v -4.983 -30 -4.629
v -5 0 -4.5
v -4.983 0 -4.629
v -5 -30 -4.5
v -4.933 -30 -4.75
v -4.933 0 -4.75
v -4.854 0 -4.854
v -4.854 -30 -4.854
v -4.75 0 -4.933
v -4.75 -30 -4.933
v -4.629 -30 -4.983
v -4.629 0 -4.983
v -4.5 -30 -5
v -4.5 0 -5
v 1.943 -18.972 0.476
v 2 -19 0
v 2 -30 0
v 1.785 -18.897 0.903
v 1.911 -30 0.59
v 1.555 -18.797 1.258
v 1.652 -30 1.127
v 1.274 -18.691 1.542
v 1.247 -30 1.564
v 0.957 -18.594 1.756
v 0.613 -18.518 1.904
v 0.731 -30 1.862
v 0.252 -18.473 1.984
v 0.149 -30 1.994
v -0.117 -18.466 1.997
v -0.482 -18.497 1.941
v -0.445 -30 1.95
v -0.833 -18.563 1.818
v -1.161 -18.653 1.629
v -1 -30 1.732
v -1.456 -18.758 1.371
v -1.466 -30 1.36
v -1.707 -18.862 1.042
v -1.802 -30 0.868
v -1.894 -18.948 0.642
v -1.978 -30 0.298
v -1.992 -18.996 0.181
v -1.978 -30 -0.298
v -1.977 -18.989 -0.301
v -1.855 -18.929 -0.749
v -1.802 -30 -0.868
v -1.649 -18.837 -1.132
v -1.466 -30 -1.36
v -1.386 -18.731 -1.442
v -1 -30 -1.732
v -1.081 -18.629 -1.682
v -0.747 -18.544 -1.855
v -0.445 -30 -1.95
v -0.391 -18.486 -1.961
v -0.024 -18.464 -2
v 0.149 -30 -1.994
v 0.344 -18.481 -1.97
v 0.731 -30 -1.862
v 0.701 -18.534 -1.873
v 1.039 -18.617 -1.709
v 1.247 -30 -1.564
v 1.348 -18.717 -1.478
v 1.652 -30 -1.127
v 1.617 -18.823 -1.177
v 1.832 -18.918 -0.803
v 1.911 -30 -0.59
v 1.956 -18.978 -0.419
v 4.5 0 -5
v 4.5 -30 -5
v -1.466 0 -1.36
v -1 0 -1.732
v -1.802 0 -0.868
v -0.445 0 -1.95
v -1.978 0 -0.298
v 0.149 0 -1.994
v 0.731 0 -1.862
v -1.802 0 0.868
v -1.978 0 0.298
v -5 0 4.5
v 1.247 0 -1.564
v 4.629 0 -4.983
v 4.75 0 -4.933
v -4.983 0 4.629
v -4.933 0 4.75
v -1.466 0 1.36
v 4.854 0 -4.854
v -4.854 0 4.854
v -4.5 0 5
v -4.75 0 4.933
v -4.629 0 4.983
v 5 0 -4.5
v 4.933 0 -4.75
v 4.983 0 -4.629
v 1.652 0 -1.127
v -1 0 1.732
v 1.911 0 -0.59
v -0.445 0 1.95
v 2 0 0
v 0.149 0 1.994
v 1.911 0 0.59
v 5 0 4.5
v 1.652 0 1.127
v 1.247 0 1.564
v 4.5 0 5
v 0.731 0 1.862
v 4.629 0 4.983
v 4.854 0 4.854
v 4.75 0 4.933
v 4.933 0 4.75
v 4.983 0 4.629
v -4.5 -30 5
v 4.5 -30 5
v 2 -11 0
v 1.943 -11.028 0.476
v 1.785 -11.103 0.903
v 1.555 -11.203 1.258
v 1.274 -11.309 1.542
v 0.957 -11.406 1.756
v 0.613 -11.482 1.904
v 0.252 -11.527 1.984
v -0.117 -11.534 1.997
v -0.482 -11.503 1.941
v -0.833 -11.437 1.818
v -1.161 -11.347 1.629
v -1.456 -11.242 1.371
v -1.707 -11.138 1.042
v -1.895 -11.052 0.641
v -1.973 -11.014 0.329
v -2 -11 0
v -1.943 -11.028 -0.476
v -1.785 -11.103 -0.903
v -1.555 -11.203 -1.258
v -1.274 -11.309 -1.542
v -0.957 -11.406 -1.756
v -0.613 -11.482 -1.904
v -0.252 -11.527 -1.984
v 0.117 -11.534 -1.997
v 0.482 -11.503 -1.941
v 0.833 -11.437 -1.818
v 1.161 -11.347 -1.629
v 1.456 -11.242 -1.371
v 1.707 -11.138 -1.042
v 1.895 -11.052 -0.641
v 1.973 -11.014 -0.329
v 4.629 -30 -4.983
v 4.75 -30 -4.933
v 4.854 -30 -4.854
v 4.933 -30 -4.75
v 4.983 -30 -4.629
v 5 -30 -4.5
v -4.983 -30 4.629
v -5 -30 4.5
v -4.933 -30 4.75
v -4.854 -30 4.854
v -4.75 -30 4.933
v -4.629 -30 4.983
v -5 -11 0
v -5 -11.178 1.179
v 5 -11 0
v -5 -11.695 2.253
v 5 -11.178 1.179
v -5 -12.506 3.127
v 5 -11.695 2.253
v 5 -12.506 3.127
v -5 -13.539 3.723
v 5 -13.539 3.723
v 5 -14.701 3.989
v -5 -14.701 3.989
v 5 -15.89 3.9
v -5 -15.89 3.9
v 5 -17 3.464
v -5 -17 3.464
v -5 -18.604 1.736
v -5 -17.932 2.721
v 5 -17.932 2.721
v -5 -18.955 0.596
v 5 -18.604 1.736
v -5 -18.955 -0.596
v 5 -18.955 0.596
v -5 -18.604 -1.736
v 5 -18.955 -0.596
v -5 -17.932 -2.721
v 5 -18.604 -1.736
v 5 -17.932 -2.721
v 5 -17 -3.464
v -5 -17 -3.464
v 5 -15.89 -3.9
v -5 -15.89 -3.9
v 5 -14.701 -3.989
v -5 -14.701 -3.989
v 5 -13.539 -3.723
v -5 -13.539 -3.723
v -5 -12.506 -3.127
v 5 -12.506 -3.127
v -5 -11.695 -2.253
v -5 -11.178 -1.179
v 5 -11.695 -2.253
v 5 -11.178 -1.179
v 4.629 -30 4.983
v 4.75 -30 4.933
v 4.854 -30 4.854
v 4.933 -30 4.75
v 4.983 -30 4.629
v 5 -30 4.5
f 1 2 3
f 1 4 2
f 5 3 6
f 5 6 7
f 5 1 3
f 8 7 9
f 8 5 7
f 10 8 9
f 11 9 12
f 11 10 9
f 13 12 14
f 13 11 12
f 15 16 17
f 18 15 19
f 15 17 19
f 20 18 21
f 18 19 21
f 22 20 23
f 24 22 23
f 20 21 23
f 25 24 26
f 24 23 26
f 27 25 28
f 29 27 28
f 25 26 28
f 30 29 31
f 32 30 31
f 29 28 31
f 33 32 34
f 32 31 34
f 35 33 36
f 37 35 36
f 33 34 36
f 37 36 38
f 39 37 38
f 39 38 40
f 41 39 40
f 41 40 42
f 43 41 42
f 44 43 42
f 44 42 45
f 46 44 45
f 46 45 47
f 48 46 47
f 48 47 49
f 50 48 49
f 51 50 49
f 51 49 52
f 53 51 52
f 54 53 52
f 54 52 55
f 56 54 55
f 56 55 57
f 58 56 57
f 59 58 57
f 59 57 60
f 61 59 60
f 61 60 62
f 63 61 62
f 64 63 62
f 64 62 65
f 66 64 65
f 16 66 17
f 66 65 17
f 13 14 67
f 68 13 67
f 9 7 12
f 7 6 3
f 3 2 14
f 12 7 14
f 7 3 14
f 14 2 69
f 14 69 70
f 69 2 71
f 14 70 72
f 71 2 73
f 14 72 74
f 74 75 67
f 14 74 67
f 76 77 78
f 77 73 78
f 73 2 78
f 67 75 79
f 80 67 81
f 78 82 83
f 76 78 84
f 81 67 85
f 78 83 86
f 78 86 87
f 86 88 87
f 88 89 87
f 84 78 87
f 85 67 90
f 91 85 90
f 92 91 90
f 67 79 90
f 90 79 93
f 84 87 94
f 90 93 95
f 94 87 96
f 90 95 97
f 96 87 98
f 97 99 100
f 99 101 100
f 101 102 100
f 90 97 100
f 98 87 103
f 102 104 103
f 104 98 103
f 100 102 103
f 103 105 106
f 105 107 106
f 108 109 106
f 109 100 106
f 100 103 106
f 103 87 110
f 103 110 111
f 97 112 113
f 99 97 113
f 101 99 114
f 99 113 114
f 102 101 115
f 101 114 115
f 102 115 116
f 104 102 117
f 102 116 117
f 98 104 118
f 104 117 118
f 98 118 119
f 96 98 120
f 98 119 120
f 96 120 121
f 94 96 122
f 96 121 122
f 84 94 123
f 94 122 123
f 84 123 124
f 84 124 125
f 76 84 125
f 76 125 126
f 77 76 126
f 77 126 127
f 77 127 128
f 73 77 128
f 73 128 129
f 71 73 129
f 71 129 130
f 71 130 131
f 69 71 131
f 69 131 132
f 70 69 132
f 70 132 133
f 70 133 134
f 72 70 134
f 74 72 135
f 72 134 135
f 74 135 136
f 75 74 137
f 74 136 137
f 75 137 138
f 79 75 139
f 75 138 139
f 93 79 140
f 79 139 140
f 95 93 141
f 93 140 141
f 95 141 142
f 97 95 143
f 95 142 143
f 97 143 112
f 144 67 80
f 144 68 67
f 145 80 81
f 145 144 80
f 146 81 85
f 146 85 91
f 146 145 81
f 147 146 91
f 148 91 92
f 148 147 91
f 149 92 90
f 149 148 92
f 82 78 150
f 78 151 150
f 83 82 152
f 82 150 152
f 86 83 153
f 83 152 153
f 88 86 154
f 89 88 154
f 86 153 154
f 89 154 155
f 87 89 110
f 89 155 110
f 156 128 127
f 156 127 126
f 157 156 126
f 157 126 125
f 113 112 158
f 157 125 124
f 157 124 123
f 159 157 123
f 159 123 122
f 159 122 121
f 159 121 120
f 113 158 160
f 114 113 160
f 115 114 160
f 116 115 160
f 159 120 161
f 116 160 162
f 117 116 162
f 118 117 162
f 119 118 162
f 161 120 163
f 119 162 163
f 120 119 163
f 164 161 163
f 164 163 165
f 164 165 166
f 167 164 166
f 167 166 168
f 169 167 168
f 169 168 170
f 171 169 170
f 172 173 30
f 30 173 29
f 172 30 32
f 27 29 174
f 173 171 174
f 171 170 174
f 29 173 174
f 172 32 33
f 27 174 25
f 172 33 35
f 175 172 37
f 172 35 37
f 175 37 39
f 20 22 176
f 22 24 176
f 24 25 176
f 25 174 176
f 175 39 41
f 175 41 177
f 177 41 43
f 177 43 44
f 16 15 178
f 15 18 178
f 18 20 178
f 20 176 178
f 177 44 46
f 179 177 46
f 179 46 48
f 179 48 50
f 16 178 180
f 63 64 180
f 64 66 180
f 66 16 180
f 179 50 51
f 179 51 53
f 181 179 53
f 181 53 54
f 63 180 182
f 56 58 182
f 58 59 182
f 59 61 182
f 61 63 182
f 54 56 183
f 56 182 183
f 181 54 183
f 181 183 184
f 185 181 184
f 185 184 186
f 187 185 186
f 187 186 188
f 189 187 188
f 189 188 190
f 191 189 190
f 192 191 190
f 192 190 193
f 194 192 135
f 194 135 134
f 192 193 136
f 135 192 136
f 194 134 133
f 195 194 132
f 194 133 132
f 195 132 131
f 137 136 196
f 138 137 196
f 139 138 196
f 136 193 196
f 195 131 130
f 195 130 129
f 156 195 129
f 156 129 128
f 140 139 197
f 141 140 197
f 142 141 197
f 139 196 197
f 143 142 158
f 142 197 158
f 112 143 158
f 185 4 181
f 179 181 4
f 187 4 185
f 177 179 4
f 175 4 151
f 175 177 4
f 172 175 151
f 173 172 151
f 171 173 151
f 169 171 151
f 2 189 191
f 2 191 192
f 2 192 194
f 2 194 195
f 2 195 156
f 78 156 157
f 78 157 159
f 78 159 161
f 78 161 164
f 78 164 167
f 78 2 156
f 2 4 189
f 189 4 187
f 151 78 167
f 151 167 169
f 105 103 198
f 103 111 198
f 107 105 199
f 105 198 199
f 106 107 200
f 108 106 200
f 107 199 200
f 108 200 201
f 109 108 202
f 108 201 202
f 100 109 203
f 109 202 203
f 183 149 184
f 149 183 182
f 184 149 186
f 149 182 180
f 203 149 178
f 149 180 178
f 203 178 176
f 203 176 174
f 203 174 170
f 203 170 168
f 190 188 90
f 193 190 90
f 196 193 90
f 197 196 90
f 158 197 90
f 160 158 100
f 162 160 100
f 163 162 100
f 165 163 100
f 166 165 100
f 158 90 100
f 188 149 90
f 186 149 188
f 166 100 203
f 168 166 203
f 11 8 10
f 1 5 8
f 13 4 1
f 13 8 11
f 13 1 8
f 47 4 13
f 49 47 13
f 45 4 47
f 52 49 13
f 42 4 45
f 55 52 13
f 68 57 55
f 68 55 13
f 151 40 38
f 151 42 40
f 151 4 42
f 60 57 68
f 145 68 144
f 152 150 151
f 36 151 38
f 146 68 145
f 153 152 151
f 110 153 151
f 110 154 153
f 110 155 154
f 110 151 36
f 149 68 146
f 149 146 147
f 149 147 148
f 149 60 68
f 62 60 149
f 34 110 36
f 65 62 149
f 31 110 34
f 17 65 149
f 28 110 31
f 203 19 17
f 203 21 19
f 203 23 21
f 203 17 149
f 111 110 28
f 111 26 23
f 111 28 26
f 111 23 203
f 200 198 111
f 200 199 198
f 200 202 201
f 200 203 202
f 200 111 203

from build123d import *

# Parameters (mm, degrees)
F0_W     = 10
F0_H     = 10
F1_DEPTH = 30
F2_R     = 2
F3_DEPTH = 46.4
F4_R     = 4
F5_DEPTH = 25
F6_R     = 0.5


with BuildPart() as f1:
    # F0 (on Front) → F1 (new body)
    with BuildSketch(Plane.XZ):
        Rectangle(F0_W, F0_H)
    extrude(amount=F1_DEPTH)

    # F2 (on face) → F3 (cut)
    with BuildSketch(Plane.XZ.offset(30)):
        Circle(F2_R)
    extrude(amount=-F3_DEPTH, mode=Mode.SUBTRACT)

    # F4 (on face) → F5 (cut)
    with BuildSketch(Plane.YZ.offset(5)):
        with Locations((-15, 0)):
            Circle(F4_R)
    extrude(amount=-F5_DEPTH, mode=Mode.SUBTRACT)

    # F6
    f6_edges = [f1.edges().sort_by_distance(p)[0] for p in [
        (-5, -15, 5),
        (5, -15, -5),
        (5, -15, 5),
        (-5, -15, -5),
    ]]
    fillet(f6_edges, radius=F6_R)


solid = f1.part
